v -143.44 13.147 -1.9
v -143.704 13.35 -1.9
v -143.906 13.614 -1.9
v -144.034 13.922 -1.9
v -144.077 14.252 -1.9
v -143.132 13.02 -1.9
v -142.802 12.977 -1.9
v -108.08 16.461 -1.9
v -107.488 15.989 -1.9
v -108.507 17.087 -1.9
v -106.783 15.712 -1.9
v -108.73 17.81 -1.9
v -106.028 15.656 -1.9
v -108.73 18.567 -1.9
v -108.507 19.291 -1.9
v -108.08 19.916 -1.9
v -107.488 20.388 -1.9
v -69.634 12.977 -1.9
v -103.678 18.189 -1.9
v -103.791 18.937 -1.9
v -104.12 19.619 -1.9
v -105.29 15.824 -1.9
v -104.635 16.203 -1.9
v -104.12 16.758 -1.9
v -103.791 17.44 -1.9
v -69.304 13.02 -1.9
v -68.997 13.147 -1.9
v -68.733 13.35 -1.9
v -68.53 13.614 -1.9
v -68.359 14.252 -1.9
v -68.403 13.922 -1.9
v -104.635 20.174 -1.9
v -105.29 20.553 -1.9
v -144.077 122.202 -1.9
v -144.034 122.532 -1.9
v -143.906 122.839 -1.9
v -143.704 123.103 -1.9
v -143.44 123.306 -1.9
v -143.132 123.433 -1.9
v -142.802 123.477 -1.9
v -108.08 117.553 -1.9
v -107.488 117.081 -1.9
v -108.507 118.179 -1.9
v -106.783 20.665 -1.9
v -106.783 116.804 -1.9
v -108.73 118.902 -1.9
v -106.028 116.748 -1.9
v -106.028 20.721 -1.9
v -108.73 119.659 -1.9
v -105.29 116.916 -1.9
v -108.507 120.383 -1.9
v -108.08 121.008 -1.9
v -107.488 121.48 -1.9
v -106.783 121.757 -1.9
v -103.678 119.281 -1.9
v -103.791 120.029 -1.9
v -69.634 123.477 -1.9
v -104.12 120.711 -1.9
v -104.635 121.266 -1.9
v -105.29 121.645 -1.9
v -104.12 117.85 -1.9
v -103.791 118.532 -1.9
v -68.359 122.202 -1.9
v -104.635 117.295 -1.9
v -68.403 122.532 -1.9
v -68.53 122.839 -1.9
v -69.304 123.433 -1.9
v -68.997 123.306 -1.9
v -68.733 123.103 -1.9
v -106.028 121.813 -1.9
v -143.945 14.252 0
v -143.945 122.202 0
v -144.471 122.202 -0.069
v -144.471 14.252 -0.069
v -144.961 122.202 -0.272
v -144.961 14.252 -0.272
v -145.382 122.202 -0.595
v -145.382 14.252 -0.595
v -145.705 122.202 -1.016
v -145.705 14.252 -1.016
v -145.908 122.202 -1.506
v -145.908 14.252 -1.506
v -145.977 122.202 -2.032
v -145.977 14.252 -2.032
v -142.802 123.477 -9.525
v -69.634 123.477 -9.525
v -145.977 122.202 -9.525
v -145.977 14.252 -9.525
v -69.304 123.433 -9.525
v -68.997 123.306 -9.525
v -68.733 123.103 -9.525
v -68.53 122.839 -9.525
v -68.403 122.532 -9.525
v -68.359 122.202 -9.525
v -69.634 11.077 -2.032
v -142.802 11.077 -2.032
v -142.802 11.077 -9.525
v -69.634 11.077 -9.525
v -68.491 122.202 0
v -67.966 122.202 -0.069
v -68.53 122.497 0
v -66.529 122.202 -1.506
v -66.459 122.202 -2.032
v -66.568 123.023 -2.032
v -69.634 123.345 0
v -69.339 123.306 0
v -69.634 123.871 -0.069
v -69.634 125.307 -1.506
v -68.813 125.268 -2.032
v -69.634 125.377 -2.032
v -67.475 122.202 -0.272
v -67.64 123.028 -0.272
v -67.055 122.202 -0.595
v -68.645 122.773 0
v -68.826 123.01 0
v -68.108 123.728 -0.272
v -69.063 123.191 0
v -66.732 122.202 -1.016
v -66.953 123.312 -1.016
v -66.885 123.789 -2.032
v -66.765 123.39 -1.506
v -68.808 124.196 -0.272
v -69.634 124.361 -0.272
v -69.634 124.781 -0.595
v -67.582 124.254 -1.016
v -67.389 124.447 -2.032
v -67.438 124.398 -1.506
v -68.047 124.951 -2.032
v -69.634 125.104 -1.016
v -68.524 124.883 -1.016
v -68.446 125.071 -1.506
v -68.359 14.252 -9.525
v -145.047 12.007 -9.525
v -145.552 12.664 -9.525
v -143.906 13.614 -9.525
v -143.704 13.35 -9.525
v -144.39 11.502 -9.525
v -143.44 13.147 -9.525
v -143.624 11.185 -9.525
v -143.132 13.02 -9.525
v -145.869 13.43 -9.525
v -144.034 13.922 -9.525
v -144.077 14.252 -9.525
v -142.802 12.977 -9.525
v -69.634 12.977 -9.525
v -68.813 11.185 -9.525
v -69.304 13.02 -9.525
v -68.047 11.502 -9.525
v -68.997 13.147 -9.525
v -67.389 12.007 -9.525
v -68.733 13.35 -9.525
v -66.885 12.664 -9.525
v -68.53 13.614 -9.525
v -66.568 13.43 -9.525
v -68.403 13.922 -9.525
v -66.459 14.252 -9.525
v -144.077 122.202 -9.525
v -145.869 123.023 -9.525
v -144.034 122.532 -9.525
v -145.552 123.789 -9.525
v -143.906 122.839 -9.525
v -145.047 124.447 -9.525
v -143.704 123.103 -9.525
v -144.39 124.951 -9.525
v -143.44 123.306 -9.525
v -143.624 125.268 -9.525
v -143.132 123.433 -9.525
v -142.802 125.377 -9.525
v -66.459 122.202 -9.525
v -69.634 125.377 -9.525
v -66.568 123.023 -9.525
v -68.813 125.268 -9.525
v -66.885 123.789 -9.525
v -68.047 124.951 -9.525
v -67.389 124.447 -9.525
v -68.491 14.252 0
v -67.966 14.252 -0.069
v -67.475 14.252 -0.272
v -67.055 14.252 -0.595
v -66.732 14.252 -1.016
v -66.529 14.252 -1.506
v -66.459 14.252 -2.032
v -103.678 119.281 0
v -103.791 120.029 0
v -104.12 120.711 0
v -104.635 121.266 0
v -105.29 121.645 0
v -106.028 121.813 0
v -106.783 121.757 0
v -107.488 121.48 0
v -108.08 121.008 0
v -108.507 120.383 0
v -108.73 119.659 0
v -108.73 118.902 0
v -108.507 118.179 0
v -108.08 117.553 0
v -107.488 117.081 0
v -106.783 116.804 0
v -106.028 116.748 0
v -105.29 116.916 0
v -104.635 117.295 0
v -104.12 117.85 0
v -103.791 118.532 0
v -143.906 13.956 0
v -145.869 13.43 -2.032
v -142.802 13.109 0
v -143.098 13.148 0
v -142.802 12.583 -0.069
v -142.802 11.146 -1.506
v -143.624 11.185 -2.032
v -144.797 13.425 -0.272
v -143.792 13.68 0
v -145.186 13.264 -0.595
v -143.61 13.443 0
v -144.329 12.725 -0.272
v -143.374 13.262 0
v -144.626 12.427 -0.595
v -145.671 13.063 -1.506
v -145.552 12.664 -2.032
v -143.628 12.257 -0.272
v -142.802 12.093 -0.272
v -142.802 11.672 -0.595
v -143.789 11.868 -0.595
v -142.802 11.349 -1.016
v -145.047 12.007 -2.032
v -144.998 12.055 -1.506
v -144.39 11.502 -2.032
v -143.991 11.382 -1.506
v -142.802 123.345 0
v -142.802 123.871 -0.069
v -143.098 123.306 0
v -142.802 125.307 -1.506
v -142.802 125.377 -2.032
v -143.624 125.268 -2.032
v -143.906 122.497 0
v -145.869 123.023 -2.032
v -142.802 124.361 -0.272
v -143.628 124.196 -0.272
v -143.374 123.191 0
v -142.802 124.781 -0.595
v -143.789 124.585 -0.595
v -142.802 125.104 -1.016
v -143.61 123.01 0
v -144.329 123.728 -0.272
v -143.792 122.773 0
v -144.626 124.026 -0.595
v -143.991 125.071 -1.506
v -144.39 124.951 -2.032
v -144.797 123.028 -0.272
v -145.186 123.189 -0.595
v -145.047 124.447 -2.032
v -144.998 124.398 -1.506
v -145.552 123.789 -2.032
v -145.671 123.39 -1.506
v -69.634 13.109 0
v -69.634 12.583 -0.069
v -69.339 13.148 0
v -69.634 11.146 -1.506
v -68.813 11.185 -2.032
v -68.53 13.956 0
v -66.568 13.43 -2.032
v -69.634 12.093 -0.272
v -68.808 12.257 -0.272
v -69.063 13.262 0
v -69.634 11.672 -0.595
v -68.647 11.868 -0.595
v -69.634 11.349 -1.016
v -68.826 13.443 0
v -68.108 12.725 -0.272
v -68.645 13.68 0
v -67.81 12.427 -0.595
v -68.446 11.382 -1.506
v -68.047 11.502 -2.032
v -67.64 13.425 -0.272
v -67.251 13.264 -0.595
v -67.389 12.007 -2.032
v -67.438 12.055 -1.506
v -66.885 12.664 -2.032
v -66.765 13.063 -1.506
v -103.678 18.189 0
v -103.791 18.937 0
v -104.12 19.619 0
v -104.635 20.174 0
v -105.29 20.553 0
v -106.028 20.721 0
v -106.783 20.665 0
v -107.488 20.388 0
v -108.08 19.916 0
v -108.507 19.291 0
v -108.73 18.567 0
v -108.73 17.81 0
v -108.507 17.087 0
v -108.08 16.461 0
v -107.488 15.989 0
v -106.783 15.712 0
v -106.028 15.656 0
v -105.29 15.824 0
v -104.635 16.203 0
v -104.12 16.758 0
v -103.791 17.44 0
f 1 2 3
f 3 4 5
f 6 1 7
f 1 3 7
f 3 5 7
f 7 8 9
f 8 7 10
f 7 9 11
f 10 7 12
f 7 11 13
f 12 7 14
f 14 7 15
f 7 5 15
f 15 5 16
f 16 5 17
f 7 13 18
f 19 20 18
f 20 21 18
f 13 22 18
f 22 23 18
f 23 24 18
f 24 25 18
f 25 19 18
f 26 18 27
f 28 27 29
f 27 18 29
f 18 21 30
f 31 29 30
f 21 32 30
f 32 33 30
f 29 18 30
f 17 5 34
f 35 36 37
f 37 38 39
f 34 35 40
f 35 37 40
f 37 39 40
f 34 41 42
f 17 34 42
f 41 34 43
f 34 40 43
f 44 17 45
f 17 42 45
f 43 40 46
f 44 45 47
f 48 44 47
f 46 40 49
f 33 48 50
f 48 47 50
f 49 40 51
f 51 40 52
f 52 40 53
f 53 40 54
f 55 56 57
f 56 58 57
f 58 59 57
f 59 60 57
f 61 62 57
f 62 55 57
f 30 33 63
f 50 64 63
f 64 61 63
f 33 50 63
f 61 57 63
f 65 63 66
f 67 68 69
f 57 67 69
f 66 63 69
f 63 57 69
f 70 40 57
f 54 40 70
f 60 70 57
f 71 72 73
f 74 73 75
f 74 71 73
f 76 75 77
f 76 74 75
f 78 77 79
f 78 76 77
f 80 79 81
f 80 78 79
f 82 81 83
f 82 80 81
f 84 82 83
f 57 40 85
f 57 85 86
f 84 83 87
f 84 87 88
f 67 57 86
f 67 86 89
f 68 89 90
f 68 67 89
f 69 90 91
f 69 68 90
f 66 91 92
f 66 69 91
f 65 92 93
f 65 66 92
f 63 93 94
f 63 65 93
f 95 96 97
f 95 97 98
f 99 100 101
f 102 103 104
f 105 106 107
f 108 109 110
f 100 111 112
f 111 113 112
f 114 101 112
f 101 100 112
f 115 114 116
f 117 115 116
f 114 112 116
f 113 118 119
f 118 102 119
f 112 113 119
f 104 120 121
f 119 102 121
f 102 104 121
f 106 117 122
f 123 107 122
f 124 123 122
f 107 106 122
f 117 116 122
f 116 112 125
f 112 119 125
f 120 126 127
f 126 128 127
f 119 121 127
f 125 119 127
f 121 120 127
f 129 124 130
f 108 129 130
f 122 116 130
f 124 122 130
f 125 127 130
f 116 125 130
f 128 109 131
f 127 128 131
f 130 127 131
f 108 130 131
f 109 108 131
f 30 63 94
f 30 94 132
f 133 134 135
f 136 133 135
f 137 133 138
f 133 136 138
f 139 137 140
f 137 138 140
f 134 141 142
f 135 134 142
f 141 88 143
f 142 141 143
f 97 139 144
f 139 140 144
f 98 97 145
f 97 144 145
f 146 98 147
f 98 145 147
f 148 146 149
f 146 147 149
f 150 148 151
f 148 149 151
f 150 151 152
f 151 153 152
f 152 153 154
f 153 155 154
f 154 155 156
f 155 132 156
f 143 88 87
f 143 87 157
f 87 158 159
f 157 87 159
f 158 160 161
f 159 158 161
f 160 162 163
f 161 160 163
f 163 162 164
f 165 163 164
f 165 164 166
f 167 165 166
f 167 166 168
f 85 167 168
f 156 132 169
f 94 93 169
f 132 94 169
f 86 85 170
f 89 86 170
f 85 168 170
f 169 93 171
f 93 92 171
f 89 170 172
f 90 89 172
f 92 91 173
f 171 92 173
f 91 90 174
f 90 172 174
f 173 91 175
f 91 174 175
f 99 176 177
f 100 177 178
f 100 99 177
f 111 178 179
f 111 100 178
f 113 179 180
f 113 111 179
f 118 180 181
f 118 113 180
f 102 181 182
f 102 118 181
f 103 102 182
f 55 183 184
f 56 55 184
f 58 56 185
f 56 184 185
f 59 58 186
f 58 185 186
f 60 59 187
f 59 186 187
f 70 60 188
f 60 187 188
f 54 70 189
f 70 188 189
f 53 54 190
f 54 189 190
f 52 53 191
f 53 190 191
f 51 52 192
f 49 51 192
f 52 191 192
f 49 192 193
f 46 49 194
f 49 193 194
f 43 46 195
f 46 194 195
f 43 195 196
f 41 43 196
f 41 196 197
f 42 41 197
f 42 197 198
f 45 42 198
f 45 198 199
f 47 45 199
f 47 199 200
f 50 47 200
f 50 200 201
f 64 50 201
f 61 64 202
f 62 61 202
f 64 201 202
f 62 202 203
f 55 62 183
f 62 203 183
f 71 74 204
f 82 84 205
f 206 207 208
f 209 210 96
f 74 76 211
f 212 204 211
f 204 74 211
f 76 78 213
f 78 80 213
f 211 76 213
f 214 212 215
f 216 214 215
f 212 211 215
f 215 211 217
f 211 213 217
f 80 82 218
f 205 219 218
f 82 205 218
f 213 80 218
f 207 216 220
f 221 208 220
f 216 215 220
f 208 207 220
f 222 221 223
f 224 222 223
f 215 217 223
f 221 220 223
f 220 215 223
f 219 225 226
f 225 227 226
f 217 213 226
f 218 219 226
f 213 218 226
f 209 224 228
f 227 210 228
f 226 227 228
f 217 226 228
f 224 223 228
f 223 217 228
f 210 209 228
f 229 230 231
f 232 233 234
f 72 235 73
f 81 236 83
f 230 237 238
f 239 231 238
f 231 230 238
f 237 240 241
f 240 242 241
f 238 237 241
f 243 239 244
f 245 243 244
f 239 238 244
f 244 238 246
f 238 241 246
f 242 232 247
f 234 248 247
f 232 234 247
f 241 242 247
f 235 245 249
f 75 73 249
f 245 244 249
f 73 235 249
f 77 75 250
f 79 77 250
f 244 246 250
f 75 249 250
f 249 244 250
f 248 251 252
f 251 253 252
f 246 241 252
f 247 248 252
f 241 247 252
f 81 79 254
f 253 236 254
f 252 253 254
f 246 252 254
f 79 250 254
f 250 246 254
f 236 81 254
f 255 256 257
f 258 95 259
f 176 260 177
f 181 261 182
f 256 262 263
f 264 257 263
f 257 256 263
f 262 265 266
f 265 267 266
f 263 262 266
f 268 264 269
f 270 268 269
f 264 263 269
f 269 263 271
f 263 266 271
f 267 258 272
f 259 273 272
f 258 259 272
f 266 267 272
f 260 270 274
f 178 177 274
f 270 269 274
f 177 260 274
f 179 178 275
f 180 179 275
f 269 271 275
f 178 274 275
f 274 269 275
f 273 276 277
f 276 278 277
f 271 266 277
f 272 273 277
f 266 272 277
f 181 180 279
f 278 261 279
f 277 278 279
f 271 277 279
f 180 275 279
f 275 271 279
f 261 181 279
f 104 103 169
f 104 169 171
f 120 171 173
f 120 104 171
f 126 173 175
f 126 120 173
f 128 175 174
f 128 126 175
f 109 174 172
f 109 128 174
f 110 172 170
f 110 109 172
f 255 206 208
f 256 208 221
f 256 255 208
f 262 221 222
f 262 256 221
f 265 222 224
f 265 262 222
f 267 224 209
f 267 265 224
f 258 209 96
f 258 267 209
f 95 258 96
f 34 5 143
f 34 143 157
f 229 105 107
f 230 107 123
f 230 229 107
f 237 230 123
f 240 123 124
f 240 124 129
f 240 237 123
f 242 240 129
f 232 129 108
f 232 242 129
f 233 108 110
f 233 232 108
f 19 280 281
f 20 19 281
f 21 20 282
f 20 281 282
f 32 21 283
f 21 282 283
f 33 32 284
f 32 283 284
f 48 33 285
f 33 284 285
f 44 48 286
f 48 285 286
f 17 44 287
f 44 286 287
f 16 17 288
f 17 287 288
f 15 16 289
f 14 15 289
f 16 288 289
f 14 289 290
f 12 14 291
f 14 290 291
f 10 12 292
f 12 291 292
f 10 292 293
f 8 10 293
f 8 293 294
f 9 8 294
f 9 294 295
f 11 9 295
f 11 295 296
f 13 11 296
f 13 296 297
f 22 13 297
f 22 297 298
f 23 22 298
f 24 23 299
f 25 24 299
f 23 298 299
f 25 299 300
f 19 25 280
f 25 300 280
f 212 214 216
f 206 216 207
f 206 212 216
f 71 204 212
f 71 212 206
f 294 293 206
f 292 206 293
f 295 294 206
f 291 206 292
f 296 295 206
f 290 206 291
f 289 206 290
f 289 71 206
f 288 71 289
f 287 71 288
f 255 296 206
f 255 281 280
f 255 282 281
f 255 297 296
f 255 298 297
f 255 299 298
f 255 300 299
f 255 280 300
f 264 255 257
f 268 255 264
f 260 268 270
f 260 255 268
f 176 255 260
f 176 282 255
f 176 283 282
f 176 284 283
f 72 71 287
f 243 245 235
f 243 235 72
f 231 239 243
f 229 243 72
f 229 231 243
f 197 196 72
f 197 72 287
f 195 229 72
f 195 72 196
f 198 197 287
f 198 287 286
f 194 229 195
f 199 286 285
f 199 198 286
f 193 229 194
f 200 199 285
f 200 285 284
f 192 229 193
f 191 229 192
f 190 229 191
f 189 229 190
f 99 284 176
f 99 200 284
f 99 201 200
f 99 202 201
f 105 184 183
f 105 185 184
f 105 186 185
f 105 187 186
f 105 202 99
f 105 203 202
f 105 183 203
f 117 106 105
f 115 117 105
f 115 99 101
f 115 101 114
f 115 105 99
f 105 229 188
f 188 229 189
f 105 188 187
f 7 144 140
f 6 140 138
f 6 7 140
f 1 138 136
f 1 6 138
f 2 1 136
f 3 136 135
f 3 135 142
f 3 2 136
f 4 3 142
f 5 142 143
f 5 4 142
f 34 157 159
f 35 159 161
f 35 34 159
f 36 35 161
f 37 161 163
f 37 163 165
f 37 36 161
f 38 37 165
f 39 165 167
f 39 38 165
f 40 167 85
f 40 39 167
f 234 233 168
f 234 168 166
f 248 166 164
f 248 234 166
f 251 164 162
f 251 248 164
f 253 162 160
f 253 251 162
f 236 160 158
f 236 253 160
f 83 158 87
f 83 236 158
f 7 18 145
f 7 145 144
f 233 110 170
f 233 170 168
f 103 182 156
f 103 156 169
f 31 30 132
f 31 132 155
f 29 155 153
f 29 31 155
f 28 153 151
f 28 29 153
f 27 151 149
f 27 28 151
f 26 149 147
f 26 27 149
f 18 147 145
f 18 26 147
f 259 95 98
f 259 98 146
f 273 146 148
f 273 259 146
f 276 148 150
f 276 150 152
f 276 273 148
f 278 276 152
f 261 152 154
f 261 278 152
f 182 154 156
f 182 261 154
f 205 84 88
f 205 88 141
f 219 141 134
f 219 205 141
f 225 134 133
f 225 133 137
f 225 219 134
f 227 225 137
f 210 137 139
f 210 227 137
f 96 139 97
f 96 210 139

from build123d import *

# Parameters (mm, degrees)
F1_DEPTH = 9.525
F0_R     = 2.54
F2_DEPTH = 1.9
F3_R     = 2.032


with BuildPart() as f1:
    # F0 (on Top) → F1 (new body)
    with BuildSketch(Plane.XY):
        with BuildLine():
            ThreePointArc((-69.634456, 11.076584), (-67.389392, 12.00652), (-66.459456, 14.251584))
            Line((-66.459456, 14.251584), (-66.459456, 122.201584))
            ThreePointArc((-66.459456, 122.201584), (-67.389392, 124.446648), (-69.634456, 125.376584))
            Line((-69.634456, 125.376584), (-142.802102, 125.376584))
            ThreePointArc((-142.802102, 125.376584), (-145.047166, 124.446648), (-145.977102, 122.201584))
            Line((-145.977102, 122.201584), (-145.977102, 14.251584))
            ThreePointArc((-145.977102, 14.251584), (-145.047166, 12.00652), (-142.802102, 11.076584))
            Line((-142.802102, 11.076584), (-69.634456, 11.076584))
        make_face()
        with BuildLine():
            ThreePointArc((-69.634456, 123.476584), (-68.732894, 123.103146), (-68.359456, 122.201584))
            Line((-68.359456, 122.201584), (-68.359456, 14.251584))
            ThreePointArc((-68.359456, 14.251584), (-68.732894, 13.350023), (-69.634456, 12.976584))
            Line((-69.634456, 12.976584), (-142.802102, 12.976584))
            ThreePointArc((-142.802102, 12.976584), (-143.703663, 13.350023), (-144.077102, 14.251584))
            Line((-144.077102, 14.251584), (-144.077102, 122.201584))
            ThreePointArc((-144.077102, 122.201584), (-143.703663, 123.103146), (-142.802102, 123.476584))
            Line((-142.802102, 123.476584), (-69.634456, 123.476584))
        make_face(mode=Mode.SUBTRACT)
    extrude(amount=-F1_DEPTH)

    # F0 (on Top) → F2 (join)
    with BuildSketch(Plane.XY):
        with BuildLine():
            Line((-68.359456, 14.251584), (-68.359456, 122.201584))
            ThreePointArc((-68.359456, 122.201584), (-68.732894, 123.103146), (-69.634456, 123.476584))
            Line((-69.634456, 123.476584), (-142.802102, 123.476584))
            ThreePointArc((-142.802102, 123.476584), (-143.703663, 123.103146), (-144.077102, 122.201584))
            Line((-144.077102, 122.201584), (-144.077102, 14.251584))
            ThreePointArc((-144.077102, 14.251584), (-143.703663, 13.350023), (-142.802102, 12.976584))
            Line((-142.802102, 12.976584), (-69.634456, 12.976584))
            ThreePointArc((-69.634456, 12.976584), (-68.732894, 13.350023), (-68.359456, 14.251584))
        make_face()
        with Locations((-106.218279, 18.188584)):
            Circle(F0_R, mode=Mode.SUBTRACT)
        with Locations((-106.218279, 119.280584)):
            Circle(F0_R, mode=Mode.SUBTRACT)
    extrude(amount=-F2_DEPTH)

    # F3
    f3_edges = [f1.edges().sort_by_distance(p)[0] for p in [
        (-106.218279, 125.376584, 0),
    ]]
    fillet(f3_edges, radius=F3_R)


solid = f1.part
